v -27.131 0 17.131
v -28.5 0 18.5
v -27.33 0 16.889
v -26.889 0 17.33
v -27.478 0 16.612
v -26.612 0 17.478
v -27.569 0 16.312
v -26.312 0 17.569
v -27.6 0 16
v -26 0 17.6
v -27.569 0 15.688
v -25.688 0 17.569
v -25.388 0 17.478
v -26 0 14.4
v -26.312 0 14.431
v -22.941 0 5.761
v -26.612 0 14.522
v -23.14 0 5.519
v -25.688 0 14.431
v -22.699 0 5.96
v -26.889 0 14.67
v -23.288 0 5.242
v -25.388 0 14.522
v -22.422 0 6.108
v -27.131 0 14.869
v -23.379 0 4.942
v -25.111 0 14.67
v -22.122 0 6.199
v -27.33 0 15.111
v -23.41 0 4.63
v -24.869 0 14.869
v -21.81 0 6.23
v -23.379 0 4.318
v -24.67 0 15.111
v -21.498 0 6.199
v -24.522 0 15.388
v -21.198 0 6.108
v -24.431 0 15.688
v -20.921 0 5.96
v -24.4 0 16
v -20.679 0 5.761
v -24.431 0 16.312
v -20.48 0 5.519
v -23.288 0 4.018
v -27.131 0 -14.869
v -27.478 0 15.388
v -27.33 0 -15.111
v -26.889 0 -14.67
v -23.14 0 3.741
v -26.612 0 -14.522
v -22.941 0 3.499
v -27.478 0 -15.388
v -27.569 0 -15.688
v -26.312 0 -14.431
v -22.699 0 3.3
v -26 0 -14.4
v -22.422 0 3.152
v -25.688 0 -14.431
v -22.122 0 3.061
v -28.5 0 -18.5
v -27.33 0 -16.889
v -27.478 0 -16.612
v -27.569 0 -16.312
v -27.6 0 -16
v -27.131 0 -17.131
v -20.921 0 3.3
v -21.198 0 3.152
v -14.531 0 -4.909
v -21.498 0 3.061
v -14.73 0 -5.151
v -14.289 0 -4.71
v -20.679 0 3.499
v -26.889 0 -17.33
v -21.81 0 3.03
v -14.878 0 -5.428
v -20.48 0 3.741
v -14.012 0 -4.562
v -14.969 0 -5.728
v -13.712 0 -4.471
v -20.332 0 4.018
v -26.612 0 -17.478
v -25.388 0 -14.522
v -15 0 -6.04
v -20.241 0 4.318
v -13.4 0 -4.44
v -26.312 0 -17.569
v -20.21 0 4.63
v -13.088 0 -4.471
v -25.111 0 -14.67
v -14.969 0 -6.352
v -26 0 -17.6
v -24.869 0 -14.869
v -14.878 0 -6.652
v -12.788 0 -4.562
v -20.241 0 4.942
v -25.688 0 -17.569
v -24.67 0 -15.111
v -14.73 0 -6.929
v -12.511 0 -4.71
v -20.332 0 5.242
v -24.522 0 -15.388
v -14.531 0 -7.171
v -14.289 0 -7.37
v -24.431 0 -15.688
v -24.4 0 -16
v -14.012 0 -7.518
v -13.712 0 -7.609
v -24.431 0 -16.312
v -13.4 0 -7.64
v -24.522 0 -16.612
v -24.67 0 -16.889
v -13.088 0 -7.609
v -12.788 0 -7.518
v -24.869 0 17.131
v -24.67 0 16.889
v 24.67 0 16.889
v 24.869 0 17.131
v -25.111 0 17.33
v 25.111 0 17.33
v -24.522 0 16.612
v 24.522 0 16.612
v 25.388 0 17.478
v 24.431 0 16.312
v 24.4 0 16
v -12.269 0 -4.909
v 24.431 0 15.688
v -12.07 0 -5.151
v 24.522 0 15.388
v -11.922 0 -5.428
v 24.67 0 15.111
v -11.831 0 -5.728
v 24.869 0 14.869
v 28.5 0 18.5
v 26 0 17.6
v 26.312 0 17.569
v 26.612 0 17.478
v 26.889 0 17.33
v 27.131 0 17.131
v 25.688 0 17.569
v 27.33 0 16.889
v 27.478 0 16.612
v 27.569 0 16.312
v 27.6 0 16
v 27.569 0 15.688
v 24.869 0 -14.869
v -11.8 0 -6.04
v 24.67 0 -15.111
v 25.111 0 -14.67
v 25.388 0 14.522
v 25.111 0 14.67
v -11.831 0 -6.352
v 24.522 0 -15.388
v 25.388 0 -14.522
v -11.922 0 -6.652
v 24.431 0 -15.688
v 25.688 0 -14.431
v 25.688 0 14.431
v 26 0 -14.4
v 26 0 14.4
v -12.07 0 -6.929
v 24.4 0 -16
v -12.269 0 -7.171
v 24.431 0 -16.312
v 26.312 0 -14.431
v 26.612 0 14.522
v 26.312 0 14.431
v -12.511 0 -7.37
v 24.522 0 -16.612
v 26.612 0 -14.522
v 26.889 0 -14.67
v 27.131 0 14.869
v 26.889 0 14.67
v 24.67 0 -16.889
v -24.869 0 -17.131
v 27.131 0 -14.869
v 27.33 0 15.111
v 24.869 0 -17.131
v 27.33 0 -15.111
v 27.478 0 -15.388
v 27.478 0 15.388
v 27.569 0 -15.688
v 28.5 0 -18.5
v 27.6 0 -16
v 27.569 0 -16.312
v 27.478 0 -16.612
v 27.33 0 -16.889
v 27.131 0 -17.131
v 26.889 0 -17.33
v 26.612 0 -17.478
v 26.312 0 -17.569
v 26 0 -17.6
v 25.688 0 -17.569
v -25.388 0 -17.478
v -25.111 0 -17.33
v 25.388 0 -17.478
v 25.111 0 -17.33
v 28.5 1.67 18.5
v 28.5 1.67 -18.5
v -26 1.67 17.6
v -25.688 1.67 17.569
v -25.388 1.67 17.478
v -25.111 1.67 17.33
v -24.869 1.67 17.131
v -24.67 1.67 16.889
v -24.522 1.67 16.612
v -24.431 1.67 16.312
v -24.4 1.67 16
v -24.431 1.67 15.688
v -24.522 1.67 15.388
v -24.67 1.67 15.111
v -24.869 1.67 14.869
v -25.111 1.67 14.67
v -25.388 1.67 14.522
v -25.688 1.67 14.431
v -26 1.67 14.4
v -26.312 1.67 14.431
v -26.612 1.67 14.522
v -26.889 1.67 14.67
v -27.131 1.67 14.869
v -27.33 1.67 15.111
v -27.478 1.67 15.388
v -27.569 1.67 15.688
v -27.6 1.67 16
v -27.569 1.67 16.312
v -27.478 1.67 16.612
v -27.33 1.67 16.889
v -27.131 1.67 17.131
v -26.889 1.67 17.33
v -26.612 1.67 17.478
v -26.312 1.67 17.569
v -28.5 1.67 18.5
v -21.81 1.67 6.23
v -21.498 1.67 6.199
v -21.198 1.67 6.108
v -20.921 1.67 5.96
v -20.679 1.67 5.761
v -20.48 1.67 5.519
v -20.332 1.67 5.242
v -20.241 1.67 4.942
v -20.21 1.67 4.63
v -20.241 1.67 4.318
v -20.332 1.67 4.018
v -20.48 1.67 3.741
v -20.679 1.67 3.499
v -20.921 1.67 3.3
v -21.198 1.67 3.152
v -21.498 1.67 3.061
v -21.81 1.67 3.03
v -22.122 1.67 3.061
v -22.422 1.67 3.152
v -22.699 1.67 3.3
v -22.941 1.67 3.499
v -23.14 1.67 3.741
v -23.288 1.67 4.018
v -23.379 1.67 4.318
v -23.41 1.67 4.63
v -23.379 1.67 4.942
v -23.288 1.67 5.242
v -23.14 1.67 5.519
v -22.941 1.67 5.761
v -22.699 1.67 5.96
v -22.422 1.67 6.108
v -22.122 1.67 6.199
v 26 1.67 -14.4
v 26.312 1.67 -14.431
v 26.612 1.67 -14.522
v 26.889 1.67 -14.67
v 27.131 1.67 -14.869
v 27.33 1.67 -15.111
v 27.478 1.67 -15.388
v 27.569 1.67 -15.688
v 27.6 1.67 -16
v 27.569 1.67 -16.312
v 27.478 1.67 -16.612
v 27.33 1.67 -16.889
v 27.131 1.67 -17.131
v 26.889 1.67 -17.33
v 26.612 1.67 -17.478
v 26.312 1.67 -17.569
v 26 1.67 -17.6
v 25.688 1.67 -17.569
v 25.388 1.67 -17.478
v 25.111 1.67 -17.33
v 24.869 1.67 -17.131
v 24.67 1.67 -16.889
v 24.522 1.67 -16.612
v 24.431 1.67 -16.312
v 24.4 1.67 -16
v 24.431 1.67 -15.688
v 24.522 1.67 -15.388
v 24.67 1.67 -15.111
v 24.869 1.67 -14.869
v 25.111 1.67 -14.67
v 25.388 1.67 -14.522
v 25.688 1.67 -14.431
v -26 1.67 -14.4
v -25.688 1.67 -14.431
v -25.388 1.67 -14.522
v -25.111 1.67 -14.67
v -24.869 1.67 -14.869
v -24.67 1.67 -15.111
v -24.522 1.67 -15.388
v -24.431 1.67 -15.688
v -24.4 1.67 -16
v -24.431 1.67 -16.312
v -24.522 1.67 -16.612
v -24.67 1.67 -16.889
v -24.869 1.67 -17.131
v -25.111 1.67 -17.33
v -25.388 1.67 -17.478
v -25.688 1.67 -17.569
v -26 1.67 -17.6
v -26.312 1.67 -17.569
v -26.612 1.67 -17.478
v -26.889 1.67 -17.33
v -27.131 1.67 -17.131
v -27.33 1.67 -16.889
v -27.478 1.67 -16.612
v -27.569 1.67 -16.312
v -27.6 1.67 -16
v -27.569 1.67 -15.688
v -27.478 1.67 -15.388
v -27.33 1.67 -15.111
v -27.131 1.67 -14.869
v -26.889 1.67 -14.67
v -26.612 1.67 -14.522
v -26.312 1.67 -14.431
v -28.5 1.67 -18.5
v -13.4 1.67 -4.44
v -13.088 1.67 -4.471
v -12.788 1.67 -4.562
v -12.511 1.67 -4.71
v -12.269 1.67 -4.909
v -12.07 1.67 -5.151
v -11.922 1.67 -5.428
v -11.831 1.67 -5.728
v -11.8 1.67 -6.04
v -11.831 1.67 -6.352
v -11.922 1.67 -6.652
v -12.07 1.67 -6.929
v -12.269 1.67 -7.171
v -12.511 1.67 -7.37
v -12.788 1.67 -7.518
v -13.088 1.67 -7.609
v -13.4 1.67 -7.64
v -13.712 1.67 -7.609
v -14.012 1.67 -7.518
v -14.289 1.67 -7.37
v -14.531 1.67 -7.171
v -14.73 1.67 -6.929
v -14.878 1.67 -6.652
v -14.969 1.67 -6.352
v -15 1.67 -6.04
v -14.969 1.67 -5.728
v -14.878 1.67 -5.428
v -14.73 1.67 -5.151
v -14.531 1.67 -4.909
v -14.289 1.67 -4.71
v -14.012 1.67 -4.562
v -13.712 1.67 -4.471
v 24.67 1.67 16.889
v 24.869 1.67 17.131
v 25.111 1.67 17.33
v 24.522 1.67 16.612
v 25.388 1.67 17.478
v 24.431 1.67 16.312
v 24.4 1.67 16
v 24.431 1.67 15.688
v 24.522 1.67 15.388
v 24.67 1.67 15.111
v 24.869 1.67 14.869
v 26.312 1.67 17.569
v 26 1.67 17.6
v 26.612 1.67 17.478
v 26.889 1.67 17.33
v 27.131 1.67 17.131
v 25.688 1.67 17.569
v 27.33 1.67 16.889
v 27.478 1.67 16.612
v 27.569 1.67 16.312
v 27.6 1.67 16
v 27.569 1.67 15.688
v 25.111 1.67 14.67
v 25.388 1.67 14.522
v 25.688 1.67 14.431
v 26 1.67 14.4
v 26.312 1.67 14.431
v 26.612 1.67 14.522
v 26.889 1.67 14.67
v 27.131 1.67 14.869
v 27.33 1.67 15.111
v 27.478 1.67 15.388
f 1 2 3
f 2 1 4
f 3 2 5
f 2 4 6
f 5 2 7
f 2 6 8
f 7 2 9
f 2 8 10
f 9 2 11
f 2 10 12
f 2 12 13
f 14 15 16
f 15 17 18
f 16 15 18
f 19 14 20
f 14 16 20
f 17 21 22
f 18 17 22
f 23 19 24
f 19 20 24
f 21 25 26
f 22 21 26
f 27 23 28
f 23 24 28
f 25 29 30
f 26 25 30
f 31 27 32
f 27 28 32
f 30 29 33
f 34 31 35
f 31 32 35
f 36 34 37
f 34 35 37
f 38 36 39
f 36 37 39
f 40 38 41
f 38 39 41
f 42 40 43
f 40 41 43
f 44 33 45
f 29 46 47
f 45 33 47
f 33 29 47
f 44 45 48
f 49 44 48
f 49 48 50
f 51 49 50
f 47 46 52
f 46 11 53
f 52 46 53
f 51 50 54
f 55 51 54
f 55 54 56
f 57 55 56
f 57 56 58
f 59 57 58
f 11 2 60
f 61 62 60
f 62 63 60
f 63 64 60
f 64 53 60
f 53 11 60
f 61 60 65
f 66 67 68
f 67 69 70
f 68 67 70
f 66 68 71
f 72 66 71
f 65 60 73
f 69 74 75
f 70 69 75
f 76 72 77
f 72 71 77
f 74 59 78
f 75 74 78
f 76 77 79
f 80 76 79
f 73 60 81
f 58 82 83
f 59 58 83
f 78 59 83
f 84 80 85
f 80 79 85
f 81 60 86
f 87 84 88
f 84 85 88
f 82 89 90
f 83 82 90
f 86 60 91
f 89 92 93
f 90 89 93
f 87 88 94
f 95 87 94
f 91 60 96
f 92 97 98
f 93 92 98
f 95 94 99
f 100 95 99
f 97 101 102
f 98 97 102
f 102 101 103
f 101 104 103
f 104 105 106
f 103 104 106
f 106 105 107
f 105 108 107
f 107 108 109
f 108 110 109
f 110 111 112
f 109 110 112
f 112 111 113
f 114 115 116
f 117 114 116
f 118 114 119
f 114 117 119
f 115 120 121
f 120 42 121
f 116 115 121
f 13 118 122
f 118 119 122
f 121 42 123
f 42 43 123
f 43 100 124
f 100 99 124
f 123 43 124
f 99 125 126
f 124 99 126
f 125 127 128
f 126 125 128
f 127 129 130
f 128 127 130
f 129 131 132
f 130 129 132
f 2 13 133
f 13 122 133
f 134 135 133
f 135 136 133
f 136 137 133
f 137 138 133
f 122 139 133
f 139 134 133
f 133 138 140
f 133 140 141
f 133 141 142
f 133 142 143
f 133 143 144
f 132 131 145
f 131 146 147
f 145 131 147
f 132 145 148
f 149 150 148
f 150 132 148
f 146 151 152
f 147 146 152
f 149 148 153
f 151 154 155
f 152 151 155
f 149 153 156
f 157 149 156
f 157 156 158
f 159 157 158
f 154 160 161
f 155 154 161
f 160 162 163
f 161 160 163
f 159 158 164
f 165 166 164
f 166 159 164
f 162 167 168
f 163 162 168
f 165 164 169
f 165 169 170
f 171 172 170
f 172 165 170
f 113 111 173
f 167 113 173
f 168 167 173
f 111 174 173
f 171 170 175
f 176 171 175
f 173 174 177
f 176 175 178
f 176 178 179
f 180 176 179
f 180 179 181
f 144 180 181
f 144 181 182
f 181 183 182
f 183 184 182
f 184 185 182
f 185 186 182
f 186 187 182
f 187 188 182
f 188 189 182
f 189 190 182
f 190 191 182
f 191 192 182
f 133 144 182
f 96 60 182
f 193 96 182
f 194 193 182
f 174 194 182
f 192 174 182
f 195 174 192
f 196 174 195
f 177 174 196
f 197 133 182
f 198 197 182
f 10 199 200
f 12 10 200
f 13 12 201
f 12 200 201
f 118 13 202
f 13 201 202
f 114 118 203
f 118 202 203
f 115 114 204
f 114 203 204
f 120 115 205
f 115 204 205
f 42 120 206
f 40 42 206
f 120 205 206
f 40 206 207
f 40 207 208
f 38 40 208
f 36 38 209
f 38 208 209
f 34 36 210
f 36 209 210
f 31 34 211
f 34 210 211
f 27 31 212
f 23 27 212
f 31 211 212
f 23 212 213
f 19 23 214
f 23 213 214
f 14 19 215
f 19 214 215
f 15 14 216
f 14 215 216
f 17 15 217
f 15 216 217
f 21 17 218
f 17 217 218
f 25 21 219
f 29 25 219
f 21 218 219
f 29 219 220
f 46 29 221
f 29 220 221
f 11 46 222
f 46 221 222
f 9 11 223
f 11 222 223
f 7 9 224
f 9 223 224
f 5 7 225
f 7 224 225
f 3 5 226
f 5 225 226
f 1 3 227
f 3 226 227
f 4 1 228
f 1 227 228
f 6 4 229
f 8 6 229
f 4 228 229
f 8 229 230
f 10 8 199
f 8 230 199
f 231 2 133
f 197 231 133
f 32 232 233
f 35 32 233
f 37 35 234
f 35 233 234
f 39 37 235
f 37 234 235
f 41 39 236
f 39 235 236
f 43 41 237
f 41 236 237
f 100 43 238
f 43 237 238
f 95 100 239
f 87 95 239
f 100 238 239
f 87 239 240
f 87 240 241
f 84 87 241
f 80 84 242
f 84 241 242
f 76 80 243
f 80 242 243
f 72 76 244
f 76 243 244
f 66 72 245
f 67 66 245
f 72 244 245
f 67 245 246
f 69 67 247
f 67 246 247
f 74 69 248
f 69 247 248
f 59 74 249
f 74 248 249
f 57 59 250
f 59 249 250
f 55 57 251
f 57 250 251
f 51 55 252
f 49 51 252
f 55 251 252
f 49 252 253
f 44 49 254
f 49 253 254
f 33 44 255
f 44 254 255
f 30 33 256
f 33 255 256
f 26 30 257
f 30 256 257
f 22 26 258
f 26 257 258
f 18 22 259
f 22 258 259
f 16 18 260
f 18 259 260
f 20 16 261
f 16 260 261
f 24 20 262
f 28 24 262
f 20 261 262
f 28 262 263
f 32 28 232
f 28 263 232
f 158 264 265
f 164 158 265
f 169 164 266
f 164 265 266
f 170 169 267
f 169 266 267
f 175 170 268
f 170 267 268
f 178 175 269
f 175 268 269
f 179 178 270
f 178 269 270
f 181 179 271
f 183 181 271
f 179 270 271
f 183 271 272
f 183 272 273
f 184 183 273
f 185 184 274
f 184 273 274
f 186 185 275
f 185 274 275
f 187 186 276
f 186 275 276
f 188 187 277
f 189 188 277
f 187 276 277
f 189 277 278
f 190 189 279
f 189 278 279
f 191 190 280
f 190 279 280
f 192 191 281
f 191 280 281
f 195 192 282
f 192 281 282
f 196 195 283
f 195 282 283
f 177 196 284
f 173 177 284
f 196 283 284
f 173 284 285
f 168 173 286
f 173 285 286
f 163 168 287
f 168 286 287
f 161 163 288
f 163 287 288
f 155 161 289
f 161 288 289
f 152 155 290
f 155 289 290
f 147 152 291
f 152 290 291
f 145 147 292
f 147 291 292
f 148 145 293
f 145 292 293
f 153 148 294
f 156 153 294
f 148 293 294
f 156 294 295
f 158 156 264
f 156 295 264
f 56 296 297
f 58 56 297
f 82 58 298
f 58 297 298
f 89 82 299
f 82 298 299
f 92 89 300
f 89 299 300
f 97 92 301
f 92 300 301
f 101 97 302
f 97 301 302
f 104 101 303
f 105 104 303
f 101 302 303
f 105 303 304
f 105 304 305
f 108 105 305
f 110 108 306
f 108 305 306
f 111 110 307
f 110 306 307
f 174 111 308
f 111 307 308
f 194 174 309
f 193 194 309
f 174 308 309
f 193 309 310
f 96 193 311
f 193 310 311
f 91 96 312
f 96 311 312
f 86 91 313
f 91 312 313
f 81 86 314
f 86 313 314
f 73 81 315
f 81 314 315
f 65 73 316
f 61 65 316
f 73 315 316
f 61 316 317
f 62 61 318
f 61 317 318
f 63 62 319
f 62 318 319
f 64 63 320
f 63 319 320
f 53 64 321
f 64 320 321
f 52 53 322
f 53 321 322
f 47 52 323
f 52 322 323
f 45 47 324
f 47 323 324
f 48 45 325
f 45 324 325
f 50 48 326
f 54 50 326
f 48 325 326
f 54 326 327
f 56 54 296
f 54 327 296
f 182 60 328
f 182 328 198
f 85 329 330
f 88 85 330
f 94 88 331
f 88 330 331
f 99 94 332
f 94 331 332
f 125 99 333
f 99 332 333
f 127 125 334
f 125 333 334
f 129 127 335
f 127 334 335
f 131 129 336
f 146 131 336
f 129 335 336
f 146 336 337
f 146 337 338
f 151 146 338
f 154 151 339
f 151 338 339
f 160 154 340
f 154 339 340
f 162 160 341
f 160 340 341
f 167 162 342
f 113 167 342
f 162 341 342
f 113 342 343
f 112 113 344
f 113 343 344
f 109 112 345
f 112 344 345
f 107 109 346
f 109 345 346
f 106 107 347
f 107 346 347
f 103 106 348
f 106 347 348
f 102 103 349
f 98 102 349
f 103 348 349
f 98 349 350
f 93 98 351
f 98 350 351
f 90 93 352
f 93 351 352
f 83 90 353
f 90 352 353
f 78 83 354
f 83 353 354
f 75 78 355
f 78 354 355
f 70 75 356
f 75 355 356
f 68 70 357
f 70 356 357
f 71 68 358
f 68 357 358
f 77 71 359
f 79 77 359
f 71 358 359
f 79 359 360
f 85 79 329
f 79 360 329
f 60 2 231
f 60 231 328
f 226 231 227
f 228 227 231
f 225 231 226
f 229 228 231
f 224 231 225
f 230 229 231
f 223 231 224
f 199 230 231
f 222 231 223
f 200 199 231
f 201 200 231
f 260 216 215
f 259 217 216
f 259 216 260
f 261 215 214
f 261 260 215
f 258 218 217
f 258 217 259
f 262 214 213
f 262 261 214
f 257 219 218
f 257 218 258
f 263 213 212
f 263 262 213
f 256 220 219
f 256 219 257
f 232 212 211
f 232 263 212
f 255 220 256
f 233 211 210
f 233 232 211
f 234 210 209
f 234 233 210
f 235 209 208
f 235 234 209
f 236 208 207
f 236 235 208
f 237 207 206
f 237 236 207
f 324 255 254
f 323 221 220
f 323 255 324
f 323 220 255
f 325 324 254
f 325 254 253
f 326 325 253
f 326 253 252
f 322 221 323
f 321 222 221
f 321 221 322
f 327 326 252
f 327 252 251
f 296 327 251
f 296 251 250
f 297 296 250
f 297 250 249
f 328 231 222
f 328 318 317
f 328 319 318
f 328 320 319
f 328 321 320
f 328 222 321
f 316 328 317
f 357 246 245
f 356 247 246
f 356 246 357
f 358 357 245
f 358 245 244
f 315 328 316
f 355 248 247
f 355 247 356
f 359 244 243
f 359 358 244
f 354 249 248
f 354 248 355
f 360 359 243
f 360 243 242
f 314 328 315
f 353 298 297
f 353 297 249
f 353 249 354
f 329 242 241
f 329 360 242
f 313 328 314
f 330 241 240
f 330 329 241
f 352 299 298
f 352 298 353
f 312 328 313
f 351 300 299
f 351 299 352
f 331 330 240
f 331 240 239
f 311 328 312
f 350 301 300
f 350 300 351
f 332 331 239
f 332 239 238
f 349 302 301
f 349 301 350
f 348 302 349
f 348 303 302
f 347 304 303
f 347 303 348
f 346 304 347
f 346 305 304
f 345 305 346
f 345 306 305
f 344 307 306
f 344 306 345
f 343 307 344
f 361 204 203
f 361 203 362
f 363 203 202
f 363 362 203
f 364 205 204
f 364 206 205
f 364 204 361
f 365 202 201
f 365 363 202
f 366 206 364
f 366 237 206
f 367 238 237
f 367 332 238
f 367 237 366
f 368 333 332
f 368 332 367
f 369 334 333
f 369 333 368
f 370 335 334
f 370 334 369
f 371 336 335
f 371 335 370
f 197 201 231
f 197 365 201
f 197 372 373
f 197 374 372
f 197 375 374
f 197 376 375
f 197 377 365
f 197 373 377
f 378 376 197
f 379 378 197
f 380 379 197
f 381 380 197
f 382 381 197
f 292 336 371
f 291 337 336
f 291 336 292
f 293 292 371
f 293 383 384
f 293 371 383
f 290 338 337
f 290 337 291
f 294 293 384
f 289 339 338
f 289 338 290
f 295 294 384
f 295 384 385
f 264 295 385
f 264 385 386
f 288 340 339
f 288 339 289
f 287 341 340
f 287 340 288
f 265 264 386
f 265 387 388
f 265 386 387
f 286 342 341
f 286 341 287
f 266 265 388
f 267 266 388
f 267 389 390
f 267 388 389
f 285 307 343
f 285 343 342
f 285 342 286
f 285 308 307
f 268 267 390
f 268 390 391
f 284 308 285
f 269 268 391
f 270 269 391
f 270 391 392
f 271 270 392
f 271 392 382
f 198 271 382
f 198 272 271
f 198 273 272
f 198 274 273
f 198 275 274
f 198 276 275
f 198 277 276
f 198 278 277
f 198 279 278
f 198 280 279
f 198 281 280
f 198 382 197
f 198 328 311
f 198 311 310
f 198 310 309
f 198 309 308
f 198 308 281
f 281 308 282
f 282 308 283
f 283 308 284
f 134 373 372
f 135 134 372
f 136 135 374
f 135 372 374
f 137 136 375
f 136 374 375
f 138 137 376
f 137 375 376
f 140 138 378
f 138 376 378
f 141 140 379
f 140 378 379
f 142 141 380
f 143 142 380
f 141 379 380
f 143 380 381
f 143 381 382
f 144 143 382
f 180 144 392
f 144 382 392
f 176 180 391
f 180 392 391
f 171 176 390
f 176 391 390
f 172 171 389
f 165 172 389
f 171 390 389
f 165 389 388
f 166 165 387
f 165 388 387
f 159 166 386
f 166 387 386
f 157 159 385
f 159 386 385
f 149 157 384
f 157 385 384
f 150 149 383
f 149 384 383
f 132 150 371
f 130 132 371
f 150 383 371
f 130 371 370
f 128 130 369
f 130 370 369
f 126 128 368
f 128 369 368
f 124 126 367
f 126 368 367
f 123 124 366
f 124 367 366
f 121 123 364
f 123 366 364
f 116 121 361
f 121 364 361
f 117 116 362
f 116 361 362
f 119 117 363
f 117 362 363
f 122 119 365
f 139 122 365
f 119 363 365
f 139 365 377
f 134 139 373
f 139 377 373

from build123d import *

# Parameters (mm, degrees)
SKETCH1_W           = 57
SKETCH1_H           = 37
BOSS_EXTRUDE1_DEPTH = 1.67
SKETCH2_R           = 1.6
CUT_EXTRUDE1_DEPTH  = 1.67


with BuildPart() as part:
    # Sketch1 → Boss-Extrude1 (new body)
    with BuildSketch(Plane(origin=(0, 0, 0), x_dir=(1, 0, 0), z_dir=(0, 1, 0))):
        Rectangle(SKETCH1_W, SKETCH1_H)
    extrude(amount=BOSS_EXTRUDE1_DEPTH)

    # Sketch2 → Cut-Extrude1 (cut)
    with BuildSketch(Plane(origin=(0, 1.67, 0), x_dir=(1, 0, 0), z_dir=(0, 1, 0))):
        with Locations(Location((-26, -16, 0), (0, 0, 270))):
            Circle(SKETCH2_R)
        with Locations(Location((-26, 16, 0), (0, 0, 270))):
            Circle(SKETCH2_R)
        with Locations(Location((26, -16, 0), (0, 0, 270))):
            Circle(SKETCH2_R)
        with Locations(Location((26, 16, 0), (0, 0, 270))):
            Circle(SKETCH2_R)
        with Locations(Location((-13.4, 6.04, 0), (0, 0, 270))):
            Circle(SKETCH2_R)
        with Locations(Location((-21.81, -4.63, 0), (0, 0, 270))):
            Circle(SKETCH2_R)
    extrude(amount=-CUT_EXTRUDE1_DEPTH, mode=Mode.SUBTRACT)


solid = part.part
